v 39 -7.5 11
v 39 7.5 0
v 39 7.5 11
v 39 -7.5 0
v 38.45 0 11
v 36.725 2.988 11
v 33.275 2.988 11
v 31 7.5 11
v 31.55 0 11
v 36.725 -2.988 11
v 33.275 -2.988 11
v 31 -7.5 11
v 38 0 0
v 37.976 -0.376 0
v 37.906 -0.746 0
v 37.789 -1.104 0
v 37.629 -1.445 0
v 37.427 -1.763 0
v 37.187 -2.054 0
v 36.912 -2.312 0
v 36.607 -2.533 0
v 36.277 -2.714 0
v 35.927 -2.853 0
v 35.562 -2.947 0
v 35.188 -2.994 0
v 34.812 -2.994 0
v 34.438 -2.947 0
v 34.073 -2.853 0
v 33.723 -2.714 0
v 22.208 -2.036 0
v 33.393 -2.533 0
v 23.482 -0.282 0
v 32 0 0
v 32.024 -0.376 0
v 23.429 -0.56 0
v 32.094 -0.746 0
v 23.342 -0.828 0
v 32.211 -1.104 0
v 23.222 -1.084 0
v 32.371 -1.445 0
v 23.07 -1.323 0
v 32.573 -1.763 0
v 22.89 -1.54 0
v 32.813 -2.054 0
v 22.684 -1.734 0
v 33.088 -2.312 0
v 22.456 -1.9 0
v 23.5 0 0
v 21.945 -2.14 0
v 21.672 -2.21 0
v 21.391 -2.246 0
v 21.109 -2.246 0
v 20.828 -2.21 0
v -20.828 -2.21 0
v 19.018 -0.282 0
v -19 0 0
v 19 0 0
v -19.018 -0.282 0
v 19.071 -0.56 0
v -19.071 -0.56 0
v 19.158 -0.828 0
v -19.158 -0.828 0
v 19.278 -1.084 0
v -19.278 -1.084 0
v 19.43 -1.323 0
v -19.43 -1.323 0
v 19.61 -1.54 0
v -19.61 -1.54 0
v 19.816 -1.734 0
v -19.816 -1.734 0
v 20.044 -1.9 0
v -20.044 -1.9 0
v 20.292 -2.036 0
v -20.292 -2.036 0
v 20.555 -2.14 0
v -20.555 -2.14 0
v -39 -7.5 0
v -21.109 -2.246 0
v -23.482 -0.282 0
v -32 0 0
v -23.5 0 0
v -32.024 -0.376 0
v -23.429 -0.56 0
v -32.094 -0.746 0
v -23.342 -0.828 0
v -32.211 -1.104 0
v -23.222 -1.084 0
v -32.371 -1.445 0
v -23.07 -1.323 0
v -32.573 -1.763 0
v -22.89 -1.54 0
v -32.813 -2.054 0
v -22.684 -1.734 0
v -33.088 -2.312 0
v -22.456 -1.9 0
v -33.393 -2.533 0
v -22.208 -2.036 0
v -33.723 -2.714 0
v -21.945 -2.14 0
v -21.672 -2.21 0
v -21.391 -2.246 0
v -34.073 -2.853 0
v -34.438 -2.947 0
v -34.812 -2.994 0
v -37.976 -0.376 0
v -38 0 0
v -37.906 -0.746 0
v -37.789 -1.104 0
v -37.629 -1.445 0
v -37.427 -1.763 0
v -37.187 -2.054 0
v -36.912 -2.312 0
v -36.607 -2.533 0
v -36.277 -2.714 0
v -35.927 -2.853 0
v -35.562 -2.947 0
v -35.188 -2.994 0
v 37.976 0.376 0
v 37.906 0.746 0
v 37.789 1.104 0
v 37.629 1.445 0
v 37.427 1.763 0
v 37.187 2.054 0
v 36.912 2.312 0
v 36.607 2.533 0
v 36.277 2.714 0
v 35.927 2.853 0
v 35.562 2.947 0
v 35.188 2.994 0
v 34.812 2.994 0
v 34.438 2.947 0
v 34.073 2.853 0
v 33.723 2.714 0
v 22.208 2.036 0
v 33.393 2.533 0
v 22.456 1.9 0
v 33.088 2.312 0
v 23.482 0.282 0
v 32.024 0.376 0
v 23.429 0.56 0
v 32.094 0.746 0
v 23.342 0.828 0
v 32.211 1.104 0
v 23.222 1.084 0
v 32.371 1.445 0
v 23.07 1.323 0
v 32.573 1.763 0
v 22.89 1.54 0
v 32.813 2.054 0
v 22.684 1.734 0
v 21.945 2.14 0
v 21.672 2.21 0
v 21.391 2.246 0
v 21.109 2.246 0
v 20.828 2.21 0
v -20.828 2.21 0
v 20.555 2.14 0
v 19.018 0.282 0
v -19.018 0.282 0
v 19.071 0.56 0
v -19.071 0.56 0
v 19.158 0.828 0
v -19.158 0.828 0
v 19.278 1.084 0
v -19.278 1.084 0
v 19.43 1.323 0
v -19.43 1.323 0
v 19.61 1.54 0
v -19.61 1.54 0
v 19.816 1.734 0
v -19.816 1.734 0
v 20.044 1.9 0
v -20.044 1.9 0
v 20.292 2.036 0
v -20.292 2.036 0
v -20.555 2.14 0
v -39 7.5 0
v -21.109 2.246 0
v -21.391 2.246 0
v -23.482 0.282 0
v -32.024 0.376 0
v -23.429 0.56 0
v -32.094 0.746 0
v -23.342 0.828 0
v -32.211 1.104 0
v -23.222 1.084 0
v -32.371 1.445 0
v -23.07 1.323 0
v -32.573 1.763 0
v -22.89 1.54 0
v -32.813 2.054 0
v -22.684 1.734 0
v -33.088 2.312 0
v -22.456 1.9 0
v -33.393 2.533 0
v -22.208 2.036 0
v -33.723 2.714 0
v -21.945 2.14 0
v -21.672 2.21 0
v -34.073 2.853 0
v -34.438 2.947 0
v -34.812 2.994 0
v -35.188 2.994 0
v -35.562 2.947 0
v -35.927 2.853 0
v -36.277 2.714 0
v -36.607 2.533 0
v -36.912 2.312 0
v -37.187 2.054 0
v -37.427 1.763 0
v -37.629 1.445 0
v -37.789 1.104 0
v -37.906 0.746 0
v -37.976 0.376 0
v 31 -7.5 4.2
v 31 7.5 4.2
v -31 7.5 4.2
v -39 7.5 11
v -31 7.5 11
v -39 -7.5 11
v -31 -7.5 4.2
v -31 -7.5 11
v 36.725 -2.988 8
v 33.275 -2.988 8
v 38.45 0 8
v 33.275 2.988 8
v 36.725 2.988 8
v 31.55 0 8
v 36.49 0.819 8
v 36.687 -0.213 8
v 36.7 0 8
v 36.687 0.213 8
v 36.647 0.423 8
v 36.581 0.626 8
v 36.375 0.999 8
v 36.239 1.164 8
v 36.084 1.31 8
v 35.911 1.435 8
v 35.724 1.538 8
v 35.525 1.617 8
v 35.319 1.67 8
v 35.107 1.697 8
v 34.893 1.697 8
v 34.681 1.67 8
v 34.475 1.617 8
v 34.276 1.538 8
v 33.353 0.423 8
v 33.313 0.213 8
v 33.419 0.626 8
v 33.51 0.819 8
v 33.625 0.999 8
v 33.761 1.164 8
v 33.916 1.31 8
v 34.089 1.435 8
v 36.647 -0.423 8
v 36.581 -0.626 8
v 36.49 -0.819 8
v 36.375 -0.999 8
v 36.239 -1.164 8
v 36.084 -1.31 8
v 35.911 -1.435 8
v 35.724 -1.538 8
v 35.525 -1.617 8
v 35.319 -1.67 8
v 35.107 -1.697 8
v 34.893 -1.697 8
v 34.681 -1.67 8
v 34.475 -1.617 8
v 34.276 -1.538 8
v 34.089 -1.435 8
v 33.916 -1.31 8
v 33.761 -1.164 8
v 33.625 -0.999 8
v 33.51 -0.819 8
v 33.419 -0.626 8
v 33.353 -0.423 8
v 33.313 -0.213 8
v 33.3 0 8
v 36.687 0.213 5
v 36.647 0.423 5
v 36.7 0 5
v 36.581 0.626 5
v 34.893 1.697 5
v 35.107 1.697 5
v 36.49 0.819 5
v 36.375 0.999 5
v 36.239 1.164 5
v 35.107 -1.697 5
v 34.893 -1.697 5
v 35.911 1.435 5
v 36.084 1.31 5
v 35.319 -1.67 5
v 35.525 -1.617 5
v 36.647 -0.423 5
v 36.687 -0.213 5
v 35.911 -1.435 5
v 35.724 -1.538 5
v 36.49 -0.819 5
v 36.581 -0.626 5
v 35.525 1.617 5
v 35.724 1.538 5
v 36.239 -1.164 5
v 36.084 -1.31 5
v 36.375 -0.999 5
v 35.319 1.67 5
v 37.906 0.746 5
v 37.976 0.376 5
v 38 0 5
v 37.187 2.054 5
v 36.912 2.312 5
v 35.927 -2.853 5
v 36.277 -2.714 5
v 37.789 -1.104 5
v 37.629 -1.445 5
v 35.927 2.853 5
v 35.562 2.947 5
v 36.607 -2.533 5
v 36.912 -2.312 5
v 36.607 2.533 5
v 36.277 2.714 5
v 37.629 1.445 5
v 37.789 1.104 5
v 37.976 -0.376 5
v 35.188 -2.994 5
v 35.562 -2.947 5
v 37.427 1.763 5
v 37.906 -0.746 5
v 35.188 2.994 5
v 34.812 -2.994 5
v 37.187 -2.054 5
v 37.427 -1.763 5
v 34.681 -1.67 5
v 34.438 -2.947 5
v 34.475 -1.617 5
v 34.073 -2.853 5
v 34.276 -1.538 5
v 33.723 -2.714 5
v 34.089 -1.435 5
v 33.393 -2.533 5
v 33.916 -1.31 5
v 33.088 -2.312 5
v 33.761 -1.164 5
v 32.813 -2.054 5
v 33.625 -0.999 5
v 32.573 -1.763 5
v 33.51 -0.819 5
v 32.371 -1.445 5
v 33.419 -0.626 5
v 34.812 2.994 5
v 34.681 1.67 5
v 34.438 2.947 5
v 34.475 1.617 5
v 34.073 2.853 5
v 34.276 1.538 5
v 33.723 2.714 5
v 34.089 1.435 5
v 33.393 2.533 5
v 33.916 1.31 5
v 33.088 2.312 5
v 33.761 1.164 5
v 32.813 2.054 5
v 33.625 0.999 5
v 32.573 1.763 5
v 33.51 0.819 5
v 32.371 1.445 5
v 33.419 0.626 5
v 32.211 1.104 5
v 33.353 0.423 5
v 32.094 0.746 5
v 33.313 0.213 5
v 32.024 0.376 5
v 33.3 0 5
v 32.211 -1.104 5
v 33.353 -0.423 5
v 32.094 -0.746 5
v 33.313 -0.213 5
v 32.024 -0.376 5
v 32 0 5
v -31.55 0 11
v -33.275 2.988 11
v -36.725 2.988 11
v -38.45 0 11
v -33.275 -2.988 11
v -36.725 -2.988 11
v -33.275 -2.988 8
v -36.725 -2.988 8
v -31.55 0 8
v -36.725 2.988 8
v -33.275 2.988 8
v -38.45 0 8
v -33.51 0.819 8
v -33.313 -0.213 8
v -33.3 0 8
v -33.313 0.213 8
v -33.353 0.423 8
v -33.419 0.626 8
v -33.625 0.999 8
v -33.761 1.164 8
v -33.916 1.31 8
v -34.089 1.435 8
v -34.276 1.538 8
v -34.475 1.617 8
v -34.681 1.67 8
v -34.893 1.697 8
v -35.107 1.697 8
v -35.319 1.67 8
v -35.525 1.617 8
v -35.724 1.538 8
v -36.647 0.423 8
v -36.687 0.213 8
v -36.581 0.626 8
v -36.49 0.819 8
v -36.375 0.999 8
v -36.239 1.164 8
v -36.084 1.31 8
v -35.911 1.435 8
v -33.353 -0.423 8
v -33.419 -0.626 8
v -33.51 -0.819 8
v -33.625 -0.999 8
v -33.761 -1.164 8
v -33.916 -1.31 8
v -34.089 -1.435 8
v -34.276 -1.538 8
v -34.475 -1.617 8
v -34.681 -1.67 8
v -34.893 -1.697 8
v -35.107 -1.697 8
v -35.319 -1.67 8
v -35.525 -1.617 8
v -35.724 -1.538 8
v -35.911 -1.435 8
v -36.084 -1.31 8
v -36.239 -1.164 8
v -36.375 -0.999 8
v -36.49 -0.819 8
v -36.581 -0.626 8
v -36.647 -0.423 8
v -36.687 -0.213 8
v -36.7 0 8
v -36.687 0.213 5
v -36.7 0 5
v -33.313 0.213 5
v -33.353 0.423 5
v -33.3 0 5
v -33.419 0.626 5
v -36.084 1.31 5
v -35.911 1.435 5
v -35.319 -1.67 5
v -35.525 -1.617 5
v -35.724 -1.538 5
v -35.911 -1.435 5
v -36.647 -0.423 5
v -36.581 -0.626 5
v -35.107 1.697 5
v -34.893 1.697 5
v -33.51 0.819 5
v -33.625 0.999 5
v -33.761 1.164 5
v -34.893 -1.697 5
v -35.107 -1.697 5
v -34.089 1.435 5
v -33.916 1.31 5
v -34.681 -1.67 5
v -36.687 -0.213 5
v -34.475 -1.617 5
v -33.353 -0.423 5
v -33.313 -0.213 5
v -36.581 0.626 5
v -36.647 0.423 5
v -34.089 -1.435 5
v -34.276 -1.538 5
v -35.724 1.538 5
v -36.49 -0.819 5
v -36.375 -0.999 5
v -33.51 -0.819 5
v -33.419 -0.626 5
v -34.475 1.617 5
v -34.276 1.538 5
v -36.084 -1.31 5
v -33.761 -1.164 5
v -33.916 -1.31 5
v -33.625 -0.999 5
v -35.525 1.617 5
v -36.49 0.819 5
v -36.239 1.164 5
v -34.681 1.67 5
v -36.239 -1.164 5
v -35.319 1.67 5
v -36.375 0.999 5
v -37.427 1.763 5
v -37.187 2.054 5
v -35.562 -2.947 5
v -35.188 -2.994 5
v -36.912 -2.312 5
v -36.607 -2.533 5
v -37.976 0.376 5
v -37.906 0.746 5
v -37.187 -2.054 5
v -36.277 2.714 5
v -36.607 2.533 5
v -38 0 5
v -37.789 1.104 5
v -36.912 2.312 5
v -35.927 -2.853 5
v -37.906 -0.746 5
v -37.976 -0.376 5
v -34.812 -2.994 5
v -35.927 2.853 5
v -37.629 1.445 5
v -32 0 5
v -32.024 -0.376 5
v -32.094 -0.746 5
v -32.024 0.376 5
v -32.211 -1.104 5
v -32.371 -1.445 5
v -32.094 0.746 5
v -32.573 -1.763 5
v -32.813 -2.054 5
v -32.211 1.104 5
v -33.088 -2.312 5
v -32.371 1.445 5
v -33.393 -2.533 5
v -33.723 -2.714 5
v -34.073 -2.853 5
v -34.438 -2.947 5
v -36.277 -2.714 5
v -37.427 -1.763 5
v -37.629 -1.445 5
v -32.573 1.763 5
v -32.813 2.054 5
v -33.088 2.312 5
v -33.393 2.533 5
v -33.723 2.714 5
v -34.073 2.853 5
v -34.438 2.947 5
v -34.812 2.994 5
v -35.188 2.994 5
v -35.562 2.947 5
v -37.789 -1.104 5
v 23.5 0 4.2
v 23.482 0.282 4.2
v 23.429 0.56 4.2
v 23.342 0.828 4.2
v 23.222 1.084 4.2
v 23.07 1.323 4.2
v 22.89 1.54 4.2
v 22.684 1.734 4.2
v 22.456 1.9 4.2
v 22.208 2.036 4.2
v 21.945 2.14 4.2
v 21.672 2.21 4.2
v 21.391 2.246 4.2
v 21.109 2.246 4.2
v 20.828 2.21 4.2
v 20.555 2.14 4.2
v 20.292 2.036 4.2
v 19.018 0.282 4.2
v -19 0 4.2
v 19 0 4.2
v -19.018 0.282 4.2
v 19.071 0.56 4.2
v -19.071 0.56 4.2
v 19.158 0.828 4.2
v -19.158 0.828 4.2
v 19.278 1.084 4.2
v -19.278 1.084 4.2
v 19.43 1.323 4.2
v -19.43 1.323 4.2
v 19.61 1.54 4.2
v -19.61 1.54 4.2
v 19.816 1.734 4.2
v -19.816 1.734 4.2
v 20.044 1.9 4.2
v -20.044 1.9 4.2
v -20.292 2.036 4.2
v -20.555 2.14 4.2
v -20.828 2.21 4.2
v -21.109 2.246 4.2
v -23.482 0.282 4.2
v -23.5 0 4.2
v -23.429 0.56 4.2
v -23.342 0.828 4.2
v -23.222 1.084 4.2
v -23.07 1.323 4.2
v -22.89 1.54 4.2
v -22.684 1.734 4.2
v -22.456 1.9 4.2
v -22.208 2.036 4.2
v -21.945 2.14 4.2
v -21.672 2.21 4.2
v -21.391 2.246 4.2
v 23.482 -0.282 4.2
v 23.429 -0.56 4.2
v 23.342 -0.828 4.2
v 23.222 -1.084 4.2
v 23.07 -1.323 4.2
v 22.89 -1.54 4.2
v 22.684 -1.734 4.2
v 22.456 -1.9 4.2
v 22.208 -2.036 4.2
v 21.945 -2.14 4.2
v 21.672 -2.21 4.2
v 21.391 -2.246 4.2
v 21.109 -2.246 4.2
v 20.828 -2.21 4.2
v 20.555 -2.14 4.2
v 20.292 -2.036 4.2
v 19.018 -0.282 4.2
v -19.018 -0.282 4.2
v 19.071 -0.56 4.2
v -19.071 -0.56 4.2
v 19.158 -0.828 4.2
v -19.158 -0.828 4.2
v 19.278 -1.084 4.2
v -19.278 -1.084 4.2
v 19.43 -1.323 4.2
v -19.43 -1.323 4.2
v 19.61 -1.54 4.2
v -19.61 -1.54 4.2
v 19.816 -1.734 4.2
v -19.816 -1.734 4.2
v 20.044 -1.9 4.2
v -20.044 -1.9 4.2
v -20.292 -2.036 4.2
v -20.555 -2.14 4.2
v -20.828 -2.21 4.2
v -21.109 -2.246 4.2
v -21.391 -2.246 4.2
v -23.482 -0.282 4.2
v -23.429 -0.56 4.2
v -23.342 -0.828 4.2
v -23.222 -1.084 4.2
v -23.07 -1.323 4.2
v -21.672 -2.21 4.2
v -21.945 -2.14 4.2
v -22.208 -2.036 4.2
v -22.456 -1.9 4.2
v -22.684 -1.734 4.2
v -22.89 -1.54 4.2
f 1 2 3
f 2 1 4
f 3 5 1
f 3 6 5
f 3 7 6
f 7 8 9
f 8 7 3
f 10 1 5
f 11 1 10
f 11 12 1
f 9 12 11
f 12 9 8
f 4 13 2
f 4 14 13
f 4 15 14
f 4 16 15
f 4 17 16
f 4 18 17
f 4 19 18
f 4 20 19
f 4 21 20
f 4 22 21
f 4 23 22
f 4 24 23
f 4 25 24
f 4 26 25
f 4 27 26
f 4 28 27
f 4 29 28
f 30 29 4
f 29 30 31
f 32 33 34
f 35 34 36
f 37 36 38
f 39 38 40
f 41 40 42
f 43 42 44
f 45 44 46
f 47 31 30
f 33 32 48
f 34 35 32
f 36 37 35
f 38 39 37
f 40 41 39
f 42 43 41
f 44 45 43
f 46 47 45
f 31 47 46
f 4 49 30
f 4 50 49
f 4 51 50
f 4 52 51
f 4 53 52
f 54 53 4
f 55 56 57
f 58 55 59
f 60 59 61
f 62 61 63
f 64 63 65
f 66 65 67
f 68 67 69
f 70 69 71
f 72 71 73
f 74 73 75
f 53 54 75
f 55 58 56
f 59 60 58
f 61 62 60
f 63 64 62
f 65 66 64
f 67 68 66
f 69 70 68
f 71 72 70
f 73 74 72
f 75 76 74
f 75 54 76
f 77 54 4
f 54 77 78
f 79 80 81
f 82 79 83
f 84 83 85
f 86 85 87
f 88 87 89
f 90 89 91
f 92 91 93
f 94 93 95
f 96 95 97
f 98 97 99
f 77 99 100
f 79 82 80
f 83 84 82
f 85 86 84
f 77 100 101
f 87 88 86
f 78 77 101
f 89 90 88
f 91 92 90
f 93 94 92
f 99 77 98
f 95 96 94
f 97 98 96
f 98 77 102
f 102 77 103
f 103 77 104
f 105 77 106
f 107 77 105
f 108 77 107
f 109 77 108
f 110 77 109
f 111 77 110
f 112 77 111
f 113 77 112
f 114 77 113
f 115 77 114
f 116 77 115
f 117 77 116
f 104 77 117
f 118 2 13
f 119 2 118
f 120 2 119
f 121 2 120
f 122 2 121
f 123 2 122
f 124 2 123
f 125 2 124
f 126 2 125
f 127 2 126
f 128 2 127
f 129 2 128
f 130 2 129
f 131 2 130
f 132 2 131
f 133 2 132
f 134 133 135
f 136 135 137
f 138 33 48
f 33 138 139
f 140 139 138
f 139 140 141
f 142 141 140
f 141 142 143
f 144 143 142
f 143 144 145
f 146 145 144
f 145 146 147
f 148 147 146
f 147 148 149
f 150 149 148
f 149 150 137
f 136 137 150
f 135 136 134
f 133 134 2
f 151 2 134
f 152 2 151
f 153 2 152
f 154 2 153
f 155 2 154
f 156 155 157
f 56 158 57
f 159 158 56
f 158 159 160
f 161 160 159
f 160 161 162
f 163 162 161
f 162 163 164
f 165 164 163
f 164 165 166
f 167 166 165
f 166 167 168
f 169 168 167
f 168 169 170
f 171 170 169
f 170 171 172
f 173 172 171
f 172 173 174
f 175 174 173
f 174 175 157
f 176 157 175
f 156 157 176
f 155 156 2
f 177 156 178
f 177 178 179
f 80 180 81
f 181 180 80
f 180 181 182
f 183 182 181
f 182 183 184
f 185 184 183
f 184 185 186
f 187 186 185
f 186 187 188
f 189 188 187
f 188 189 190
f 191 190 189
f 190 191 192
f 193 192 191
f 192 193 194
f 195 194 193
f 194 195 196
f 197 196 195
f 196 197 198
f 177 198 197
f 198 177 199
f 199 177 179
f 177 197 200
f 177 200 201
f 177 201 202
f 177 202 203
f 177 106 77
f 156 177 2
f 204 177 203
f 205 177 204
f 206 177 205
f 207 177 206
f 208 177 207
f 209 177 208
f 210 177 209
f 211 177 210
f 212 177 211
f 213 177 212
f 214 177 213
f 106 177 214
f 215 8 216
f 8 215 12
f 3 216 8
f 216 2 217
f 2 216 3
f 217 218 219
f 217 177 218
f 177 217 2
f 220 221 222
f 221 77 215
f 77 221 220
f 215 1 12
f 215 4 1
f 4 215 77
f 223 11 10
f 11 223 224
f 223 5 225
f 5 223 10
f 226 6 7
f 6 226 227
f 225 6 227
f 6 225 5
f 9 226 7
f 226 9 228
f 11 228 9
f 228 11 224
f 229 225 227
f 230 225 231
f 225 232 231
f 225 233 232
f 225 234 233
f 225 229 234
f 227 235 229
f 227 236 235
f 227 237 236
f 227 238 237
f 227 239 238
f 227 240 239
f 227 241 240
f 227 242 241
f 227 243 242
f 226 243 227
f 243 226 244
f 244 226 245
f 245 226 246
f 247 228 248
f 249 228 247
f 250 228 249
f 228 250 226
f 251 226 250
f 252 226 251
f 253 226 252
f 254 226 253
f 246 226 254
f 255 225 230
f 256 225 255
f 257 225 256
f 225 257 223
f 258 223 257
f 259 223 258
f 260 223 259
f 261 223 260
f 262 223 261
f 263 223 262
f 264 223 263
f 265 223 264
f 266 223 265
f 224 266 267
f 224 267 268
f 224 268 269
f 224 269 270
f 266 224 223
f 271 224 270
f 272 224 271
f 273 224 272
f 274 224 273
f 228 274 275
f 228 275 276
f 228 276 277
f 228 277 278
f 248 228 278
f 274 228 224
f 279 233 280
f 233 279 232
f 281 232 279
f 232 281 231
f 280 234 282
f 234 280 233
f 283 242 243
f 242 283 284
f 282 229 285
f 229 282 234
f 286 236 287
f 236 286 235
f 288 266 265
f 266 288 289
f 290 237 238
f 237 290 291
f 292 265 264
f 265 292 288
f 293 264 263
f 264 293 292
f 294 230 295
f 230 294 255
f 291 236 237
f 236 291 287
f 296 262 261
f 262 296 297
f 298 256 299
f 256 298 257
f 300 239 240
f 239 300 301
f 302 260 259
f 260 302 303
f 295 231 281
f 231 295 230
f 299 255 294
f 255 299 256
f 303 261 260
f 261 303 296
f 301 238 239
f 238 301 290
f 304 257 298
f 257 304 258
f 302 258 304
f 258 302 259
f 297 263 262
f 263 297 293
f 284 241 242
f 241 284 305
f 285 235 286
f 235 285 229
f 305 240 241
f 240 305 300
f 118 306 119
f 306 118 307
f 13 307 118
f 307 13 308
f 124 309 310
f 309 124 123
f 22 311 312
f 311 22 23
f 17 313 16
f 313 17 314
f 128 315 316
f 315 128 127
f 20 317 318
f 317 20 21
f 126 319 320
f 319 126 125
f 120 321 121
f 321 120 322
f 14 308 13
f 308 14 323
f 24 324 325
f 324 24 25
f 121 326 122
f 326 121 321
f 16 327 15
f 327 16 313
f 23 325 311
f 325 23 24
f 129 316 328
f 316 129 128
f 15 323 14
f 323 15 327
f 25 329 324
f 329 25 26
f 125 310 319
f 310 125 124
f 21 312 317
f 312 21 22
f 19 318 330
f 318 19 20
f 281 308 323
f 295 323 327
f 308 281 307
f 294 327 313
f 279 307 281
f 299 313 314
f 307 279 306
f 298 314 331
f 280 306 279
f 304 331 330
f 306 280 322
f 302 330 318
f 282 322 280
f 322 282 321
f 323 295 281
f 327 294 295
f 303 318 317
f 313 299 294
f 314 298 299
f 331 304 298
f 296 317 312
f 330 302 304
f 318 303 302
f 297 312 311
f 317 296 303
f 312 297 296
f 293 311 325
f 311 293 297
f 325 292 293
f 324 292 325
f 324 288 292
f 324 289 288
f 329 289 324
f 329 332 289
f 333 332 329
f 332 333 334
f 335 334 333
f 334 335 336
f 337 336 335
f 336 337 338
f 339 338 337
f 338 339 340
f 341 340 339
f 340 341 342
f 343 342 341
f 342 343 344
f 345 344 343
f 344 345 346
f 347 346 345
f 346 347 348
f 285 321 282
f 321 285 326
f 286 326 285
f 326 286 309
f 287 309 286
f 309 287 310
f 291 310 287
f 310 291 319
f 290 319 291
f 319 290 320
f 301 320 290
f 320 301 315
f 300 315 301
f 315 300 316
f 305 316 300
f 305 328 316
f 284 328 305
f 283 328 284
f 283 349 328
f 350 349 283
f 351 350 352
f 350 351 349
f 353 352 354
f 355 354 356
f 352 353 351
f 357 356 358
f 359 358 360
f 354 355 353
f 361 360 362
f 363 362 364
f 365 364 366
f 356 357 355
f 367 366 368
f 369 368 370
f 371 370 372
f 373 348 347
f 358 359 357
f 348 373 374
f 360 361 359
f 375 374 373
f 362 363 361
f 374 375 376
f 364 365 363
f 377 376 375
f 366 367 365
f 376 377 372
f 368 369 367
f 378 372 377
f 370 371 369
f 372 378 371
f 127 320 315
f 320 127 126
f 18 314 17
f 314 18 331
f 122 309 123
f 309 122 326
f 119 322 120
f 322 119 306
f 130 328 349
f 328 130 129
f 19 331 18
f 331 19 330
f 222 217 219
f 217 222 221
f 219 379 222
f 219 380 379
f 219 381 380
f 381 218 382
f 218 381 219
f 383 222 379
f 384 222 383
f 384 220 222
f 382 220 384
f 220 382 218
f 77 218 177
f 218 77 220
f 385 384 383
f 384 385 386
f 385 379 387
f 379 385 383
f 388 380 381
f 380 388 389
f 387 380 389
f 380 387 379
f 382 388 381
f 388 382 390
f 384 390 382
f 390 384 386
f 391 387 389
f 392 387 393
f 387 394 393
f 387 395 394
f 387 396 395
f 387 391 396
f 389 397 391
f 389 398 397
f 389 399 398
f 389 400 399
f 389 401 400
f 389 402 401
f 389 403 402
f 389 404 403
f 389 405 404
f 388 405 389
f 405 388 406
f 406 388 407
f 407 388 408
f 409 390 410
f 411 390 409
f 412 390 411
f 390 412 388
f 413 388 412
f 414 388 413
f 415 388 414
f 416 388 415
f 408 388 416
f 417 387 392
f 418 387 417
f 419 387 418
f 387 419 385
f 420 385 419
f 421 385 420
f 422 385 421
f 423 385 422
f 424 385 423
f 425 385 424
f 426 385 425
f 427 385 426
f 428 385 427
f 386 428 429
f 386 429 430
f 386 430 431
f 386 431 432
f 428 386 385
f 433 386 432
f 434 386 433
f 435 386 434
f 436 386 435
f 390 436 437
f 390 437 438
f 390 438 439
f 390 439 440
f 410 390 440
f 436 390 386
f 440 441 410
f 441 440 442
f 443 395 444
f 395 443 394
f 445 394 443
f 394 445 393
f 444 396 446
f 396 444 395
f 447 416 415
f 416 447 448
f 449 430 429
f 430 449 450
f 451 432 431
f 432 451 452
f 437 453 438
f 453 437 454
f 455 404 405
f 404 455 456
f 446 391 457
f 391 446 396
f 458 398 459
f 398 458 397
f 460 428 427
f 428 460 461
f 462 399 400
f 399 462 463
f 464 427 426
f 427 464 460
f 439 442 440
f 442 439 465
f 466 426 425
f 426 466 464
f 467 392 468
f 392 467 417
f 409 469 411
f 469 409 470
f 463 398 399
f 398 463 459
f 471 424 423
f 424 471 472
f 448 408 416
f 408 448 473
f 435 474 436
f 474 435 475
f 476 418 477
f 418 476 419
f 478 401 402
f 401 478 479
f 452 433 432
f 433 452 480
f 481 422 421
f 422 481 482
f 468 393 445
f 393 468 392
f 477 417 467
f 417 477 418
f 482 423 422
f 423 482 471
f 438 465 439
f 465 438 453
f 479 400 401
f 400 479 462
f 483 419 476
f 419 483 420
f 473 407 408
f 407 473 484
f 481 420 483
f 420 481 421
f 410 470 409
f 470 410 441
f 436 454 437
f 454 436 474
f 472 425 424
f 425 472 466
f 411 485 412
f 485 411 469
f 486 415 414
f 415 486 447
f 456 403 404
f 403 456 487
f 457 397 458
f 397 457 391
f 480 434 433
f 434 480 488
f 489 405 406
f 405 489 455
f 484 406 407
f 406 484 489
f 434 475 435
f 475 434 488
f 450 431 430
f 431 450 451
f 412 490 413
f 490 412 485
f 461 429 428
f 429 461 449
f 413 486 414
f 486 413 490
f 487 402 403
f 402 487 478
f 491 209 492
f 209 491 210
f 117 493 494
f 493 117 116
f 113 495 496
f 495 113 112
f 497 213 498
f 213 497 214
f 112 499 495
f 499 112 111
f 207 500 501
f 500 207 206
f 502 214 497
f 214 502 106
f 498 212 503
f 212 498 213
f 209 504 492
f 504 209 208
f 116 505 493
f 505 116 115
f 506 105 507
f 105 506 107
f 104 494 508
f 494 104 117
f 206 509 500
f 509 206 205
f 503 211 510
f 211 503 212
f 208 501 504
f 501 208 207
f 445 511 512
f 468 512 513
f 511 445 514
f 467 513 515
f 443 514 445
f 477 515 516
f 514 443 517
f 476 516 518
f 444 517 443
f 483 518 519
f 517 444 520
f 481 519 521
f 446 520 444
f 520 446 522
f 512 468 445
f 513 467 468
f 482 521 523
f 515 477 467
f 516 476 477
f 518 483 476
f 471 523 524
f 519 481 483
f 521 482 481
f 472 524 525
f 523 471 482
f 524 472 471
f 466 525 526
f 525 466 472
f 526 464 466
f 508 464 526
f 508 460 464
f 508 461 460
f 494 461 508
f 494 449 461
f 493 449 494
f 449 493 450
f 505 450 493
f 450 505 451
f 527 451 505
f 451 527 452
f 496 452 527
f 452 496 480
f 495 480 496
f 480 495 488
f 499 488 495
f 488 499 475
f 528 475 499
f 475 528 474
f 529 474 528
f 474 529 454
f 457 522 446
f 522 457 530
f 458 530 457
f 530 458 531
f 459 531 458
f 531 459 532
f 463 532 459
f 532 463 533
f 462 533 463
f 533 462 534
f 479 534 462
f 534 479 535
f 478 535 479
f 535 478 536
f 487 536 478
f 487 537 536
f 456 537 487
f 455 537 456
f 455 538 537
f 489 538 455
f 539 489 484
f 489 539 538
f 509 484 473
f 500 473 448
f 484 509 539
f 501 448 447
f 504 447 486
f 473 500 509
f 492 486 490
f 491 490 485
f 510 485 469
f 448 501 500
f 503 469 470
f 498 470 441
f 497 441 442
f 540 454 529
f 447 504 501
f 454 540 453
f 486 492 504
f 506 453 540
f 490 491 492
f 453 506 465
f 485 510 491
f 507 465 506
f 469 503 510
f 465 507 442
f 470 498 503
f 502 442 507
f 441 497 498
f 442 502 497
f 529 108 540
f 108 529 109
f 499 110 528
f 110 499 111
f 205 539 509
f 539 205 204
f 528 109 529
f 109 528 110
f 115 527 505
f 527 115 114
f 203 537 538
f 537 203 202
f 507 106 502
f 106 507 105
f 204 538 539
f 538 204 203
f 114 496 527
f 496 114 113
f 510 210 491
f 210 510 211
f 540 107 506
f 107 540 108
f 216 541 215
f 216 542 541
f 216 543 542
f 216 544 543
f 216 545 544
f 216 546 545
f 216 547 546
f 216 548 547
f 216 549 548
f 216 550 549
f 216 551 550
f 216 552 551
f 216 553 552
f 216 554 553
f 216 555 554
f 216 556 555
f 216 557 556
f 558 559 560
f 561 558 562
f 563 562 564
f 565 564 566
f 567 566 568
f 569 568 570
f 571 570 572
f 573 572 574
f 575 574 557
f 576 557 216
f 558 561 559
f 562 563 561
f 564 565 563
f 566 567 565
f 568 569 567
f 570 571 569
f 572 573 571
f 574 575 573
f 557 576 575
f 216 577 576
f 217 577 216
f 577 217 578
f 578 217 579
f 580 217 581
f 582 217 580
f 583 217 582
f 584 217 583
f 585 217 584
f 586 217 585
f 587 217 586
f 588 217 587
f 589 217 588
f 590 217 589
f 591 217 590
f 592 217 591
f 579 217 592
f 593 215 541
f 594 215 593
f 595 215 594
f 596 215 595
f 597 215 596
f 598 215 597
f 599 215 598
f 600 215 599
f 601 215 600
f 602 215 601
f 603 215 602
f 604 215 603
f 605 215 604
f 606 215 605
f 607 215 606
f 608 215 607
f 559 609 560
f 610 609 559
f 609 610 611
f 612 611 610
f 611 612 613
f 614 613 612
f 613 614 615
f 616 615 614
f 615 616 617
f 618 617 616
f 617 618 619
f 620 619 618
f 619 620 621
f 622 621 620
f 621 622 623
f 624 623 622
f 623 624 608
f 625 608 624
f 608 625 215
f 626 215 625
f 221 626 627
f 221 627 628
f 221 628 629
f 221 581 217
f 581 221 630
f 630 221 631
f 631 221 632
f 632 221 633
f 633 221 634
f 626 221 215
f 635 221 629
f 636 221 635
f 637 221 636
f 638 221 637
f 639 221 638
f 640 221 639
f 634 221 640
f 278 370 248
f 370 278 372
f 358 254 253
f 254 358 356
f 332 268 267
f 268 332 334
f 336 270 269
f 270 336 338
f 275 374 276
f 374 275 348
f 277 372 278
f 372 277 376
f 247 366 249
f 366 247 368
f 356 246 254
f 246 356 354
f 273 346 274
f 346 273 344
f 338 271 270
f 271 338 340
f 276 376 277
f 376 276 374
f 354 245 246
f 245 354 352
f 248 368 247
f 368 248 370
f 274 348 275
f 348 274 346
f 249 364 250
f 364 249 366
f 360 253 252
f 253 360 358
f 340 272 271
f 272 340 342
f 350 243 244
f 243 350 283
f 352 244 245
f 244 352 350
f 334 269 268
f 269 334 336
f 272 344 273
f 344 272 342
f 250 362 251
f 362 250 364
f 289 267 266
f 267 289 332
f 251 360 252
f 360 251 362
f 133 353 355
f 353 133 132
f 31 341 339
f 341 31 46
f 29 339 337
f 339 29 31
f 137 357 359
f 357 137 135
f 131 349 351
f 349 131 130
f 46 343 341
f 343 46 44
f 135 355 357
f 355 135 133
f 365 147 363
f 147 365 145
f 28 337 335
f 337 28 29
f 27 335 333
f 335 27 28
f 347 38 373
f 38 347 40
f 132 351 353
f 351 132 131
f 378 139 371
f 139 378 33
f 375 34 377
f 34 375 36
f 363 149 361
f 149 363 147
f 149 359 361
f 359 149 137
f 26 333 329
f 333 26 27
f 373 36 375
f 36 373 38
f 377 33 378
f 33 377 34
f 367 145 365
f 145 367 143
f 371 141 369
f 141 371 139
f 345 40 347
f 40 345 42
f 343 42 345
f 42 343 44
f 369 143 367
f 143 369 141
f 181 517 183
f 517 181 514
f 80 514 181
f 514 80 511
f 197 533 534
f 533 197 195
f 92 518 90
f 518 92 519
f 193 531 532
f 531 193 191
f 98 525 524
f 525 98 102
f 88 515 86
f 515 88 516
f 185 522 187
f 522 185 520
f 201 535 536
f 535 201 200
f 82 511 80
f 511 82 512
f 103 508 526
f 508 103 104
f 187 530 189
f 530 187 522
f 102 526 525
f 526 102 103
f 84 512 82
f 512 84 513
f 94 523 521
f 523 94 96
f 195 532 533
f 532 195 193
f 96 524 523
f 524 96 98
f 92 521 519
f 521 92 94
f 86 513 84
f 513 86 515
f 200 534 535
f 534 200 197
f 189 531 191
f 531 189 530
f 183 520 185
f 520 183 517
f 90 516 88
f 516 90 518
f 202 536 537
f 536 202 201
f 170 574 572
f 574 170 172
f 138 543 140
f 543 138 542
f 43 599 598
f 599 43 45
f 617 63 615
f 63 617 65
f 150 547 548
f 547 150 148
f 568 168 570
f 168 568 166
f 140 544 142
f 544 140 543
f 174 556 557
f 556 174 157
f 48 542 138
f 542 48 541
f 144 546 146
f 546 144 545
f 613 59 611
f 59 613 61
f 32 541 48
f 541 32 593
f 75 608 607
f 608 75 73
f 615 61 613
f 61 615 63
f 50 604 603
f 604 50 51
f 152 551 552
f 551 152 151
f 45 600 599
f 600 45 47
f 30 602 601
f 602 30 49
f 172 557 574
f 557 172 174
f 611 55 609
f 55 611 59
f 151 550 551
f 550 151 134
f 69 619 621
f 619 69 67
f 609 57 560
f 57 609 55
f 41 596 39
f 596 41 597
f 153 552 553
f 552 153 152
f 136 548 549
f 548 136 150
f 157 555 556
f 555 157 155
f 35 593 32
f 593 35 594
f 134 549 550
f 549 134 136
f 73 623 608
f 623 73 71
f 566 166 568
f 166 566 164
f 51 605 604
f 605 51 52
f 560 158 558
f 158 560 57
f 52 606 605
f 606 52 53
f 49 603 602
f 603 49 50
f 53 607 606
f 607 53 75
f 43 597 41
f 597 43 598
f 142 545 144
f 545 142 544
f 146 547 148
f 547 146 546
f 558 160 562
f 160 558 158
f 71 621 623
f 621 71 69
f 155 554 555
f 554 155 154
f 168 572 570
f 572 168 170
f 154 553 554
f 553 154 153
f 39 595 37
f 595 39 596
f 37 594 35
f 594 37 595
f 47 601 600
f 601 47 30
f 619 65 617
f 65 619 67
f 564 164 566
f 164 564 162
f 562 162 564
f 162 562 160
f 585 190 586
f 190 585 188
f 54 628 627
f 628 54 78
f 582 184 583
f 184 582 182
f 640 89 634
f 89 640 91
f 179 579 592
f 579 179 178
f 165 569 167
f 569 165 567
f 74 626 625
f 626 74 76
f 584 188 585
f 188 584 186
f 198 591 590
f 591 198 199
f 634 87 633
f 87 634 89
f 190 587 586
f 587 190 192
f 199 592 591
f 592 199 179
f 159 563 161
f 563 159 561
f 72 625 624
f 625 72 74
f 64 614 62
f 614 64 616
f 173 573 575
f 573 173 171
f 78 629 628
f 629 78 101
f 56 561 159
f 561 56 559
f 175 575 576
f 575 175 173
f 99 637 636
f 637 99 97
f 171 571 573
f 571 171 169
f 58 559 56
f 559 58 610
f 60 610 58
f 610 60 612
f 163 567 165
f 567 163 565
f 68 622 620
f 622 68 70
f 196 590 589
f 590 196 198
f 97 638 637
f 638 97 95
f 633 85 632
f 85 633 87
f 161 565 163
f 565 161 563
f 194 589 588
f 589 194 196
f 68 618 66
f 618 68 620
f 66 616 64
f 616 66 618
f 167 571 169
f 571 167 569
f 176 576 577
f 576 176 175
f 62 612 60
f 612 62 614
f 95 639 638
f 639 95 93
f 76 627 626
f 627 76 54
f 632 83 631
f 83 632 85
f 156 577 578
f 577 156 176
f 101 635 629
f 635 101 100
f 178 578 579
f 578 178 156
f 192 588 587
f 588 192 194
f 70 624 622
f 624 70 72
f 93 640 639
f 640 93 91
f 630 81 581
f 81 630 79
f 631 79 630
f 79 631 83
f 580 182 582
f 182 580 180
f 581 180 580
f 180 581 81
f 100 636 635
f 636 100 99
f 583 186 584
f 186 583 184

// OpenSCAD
$fn=50;
//otvory v krabičce
uchyt_roztec=42.5;
uchyt_prumer=4.5;


//otvordy pro PCB mrakomeru
PCB_prumer=3.4;
PCB_roztec=70;
PCB_vyska_soucastek=7;

vyska_materialu=4;
sire_materialu=15;


M3_vyska_matky=3;
M3_sirka_matky=6.7;
M3_prumer_hlavy_sroubu=6;
M3_vyska_hlavy=5;

//sloupek
sloupek_sirka=8;



MRAKOMER4_HOLDER01A();

module MRAKOMER4_HOLDER01A()
{
difference() {
    
union() { 

translate([0,0,vyska_materialu/2]) 
minkowski()
{
  cube([uchyt_roztec+uchyt_prumer,sire_materialu-8,vyska_materialu],center=true);
  cylinder(r=4,h=0.1);
}

translate([0,0,vyska_materialu/2+0.1]) 
  cube([PCB_roztec+PCB_prumer,sire_materialu,vyska_materialu+0.2],center=true);
  


translate([PCB_roztec/2,0,0]) 
SLOUPEK();  

translate([-PCB_roztec/2,0,0]) 
SLOUPEK(); 

}
   

//otvory pro uchycení PCB
translate([PCB_roztec/2,0,vyska_materialu/2]) 
cylinder(h=vyska_materialu+052, r=PCB_prumer/2, center=true);

translate([PCB_roztec/2,0,M3_vyska_hlavy/2])   
     cylinder(h=M3_vyska_hlavy, r=M3_prumer_hlavy_sroubu/2, center=true);

translate([-PCB_roztec/2,0,vyska_materialu/2]) 
cylinder(h=vyska_materialu+0.5, r=PCB_prumer/2, center=true);

translate([-PCB_roztec/2,0,M3_vyska_hlavy/2])   
     cylinder(h=M3_vyska_hlavy, r=M3_prumer_hlavy_sroubu/2, center=true);

//otvory pro uchycení ke krabičce
translate([uchyt_roztec/2,0,vyska_materialu/2]) 
cylinder(h=vyska_materialu+0.5, r=uchyt_prumer/2, center=true);

translate([-uchyt_roztec/2,0,vyska_materialu/2]) 
cylinder(h=vyska_materialu+0.5, r=uchyt_prumer/2, center=true);


    
    }
   }
  
   
  
    
 module SLOUPEK()  
   {
 
   difference() {
       translate([0,0,(vyska_materialu+PCB_vyska_soucastek)/2])   
    cube([sloupek_sirka,sire_materialu,vyska_materialu+PCB_vyska_soucastek],center=true);   
     
     
     translate([0,0,vyska_materialu+PCB_vyska_soucastek-M3_vyska_matky])    
    cylinder (h = M3_vyska_matky+0.01, r= (M3_sirka_matky+0.2)/2, $fn=6); 
     
         translate([0,0,(vyska_materialu+PCB_vyska_soucastek)/2])   
     cylinder(h=vyska_materialu+PCB_vyska_soucastek+0.2, r=PCB_prumer/2, center=true);
     
      translate([0,0,M3_vyska_hlavy/2])   
     cylinder(h=M3_vyska_hlavy, r=M3_prumer_hlavy_sroubu/2, center=true);
     
     
      
       
    }   
  }   
        
